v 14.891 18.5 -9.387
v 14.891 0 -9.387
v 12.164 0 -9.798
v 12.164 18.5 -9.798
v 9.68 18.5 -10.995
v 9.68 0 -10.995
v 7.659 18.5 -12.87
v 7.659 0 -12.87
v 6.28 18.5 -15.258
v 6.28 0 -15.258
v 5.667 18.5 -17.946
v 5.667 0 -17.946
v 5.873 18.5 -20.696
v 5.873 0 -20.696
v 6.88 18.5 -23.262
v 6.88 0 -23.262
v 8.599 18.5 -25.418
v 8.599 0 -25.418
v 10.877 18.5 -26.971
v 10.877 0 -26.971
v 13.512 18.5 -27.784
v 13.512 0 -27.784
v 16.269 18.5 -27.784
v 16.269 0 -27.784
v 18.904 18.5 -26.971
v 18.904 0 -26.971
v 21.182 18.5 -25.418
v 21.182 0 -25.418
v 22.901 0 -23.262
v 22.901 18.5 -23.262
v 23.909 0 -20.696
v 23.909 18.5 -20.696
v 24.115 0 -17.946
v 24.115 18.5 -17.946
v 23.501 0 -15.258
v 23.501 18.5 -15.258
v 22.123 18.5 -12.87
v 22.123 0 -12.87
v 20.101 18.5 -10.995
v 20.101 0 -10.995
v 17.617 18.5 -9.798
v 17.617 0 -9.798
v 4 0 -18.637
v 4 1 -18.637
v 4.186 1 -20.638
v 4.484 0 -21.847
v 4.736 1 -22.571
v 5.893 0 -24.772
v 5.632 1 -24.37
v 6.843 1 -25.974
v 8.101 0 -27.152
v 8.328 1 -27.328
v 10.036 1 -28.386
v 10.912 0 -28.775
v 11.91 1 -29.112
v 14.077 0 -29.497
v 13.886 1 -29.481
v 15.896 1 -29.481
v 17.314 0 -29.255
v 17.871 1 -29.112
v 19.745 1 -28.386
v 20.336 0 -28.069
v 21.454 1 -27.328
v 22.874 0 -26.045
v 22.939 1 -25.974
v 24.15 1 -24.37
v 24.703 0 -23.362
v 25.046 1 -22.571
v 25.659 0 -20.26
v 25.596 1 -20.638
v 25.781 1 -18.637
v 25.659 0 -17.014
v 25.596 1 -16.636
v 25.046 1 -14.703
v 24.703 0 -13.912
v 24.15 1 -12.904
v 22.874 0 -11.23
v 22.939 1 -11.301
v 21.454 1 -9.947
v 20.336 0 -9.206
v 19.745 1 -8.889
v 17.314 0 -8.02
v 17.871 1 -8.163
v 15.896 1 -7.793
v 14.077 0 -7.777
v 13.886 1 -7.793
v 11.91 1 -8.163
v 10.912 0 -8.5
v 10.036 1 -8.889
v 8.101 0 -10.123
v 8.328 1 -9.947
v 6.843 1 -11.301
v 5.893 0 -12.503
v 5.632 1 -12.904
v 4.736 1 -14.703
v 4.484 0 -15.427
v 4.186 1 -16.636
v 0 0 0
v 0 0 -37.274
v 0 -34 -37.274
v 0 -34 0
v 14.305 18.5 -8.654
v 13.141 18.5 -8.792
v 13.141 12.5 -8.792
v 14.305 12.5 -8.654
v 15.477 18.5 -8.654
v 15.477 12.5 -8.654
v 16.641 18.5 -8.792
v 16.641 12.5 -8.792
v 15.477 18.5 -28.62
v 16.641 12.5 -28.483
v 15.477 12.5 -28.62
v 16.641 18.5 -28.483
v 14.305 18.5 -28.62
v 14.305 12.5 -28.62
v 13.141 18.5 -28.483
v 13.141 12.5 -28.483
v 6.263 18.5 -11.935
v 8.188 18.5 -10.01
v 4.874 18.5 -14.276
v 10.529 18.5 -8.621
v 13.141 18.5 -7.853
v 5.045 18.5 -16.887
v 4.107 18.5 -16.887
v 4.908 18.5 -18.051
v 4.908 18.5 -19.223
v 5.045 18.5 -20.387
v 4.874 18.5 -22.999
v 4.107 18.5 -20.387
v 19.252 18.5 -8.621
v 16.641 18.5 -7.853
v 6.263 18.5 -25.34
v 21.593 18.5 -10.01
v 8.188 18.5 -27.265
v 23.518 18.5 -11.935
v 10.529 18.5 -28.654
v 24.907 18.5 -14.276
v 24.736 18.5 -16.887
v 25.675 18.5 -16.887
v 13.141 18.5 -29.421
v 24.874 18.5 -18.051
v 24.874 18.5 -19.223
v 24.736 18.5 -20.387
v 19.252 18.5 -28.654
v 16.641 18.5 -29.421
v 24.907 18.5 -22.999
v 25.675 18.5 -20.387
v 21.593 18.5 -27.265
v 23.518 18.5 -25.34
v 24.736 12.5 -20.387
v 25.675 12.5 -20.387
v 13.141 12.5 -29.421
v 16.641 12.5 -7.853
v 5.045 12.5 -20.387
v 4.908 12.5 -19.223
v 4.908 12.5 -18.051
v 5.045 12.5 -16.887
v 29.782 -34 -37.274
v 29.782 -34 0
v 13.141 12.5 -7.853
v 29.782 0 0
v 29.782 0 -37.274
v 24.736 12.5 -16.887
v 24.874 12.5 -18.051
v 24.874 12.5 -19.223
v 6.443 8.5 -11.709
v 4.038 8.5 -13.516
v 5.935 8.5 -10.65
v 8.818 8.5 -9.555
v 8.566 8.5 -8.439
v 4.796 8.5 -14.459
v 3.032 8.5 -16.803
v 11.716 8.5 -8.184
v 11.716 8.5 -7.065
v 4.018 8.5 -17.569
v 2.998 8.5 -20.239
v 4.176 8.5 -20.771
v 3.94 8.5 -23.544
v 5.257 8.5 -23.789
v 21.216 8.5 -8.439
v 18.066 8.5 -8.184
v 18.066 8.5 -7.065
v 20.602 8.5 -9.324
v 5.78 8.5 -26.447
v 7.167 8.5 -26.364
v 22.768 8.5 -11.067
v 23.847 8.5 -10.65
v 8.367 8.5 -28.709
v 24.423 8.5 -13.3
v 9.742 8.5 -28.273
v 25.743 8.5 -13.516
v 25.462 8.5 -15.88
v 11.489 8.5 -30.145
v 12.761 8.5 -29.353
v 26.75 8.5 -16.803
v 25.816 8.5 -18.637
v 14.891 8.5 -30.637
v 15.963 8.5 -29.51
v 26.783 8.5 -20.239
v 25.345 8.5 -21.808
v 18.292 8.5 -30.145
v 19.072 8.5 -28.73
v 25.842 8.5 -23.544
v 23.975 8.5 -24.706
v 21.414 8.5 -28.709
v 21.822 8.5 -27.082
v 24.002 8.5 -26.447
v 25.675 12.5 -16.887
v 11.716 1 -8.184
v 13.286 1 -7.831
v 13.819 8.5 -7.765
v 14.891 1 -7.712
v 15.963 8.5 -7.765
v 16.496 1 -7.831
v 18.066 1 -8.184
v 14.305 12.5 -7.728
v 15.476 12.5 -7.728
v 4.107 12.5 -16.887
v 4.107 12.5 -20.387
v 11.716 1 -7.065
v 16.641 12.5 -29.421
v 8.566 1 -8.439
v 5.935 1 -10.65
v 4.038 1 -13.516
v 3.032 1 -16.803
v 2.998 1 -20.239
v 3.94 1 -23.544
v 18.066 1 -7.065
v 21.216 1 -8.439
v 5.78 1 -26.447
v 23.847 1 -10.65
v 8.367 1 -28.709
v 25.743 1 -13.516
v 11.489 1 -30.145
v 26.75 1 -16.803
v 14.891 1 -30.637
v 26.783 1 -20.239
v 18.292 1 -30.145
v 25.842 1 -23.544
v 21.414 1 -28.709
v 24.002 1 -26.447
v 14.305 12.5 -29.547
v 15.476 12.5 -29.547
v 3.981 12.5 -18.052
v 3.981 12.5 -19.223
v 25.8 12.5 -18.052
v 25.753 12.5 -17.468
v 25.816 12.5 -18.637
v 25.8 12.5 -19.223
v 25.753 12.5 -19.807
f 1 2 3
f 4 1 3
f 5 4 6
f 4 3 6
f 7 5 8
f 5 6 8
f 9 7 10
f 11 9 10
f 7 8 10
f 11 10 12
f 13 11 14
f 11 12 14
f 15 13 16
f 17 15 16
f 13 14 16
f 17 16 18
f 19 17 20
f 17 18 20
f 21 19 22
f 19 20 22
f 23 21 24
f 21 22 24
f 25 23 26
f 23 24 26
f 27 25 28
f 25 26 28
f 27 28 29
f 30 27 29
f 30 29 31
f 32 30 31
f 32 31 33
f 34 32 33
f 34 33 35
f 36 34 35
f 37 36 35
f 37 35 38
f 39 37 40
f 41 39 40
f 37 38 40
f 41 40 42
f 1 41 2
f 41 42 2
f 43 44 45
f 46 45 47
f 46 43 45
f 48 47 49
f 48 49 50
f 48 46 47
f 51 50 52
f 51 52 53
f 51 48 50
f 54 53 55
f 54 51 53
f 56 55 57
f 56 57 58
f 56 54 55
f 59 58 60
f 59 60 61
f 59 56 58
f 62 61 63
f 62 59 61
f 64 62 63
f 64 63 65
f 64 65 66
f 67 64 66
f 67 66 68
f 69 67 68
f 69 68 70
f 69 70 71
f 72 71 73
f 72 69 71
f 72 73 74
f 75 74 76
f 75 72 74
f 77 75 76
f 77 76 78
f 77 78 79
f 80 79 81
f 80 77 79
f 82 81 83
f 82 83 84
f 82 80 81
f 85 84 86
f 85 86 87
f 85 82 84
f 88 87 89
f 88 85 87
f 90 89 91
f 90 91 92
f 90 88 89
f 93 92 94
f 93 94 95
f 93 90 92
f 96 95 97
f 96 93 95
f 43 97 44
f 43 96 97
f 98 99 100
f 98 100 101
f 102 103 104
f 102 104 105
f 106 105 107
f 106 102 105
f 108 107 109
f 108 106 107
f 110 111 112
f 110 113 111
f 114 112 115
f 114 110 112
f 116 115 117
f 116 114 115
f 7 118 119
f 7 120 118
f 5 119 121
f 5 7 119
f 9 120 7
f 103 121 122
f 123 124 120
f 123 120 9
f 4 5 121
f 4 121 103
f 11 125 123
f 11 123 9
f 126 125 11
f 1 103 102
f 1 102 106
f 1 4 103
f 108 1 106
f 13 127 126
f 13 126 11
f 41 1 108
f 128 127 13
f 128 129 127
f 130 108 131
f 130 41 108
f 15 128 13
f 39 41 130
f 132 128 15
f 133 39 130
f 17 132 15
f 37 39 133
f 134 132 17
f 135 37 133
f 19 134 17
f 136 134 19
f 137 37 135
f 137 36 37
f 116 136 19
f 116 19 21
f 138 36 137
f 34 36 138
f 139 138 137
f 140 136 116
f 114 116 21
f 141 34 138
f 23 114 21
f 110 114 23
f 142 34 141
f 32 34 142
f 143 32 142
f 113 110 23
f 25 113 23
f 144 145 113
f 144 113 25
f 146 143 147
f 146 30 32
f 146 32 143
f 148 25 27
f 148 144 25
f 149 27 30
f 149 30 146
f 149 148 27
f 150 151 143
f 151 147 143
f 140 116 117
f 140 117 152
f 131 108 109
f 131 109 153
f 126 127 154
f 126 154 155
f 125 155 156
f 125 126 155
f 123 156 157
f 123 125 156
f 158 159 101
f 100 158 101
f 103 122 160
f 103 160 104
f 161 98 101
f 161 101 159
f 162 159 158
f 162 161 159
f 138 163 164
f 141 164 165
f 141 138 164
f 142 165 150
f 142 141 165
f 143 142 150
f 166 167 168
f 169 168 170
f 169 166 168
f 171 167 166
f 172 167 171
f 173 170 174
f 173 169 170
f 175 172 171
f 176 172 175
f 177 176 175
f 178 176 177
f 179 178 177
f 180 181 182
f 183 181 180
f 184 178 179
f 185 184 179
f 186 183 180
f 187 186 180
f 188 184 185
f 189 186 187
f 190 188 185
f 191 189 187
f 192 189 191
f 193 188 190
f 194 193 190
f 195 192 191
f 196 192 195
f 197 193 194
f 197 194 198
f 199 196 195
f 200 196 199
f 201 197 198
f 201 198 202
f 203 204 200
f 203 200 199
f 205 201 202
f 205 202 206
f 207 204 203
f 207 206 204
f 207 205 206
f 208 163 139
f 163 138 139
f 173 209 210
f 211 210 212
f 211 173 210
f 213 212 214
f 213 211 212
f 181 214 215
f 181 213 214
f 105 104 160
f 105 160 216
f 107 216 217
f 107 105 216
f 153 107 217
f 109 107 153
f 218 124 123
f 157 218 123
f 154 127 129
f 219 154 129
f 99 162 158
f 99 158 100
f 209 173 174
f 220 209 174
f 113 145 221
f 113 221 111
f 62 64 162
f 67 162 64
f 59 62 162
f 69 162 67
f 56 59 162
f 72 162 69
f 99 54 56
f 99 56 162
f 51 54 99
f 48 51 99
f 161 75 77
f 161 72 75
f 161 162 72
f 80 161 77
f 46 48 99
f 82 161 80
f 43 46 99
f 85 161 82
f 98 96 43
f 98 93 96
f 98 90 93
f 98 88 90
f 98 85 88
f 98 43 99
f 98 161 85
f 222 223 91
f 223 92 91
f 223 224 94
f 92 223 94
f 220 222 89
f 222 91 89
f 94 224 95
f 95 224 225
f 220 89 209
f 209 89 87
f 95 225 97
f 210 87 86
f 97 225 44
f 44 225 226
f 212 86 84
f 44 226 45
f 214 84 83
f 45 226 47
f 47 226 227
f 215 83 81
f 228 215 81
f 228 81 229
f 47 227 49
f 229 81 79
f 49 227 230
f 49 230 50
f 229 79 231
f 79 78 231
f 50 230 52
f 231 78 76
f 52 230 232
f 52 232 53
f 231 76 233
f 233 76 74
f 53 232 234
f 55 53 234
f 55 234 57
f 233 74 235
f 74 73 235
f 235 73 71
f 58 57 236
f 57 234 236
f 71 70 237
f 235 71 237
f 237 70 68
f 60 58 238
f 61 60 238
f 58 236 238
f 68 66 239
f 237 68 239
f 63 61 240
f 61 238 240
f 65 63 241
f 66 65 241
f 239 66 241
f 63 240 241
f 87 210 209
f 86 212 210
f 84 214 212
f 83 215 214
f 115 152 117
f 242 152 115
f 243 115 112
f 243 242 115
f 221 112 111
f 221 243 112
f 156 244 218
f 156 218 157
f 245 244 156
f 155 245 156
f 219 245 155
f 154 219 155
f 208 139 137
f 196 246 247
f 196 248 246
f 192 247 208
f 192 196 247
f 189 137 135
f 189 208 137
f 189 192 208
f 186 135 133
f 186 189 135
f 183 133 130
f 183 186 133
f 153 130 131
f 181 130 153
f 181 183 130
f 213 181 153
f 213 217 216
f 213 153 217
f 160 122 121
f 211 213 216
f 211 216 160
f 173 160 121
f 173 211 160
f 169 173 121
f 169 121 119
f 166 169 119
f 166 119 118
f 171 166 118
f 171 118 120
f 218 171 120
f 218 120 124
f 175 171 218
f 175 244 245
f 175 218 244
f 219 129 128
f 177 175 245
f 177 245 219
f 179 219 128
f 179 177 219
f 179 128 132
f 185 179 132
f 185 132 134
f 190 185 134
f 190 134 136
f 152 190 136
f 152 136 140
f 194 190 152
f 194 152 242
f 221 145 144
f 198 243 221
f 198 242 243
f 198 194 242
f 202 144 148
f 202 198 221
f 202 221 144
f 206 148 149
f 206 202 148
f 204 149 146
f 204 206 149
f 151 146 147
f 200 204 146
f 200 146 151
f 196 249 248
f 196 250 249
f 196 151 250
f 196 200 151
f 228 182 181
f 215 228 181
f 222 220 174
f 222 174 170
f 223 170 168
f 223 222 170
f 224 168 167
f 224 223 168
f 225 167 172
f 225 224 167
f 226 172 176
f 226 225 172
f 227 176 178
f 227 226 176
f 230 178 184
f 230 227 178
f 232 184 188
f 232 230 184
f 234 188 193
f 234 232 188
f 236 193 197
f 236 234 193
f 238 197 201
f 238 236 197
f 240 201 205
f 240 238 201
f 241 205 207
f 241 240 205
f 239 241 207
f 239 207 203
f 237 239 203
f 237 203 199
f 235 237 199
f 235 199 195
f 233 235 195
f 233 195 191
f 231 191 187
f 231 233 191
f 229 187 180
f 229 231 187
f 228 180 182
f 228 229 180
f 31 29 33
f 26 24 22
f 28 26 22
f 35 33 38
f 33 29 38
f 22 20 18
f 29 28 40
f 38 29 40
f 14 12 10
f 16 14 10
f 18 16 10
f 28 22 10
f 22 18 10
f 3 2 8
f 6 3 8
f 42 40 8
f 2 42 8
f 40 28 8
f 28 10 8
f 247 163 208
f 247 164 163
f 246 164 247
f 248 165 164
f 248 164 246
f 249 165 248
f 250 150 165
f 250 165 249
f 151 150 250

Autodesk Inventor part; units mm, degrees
ref_plane "YZ Plane" through (0, 0, 0) normal (1, 0, 0) x (0, 1, 0)
ref_plane "XZ Plane" through (0, 0, 0) normal (0, 1, 0) x (-1, 0, 0)
ref_plane "XY Plane" through (0, 0, 0) normal (0, 0, 1) x (1, 0, 0)
sketch "Sketch1" plane through (0, 0, 0) normal (0, 1, 0) x (-1, 0, 0)
  line L0 (0, 0) -> (-29.7815, 0)
  line L1 (-29.7815, 0) -> (-29.7815, -37.2745)
  line L2 (-29.7815, -37.2745) -> (0, -37.2745)
  line L3 (0, -37.2745) -> (0, 0)
  line L4 (-14.8907, -37.2745) -> (-14.8907, 0)
  line L5 (0, -18.6373) -> (-29.7815, -18.6373)
  circle A0 centre (-14.8907, -18.6373) radius 10.8903
  dimension "d0" = 29.7815
  dimension "d1" = 37.2745
  dimension "d2" = 21.7805
extrude "Extrusion1" add sketch "Sketch1" against normal blind 34
extrude "Extrusion2" add sketch "Sketch1" along normal blind 1 contours A0 L5 L4 | L4 L5 A0 | A0 L4 L5 | L4 A0 L5
sketch "Sketch2" plane through (14.8907, 1, -18.6373) normal (0, 1, 0) x (1, 0, 0)
  circle A0 centre (0, 0) radius 12
  dimension "d9" = 24
extrude "Extrusion3" add sketch "Sketch2" along normal blind 7.5
sketch "Sketch3" plane through (14.8907, 8.5, -18.6373) normal (0, 1, 0) x (1, 0, 0)
  circle A0 centre (0, 0) radius 10.925
  circle A1 centre (0, 0) radius 12 projected
  line L0 (-3.175, -12) -> (3.175, -12)
  line L1 (3.175, -12) -> (3.175, 12)
  line L2 (3.175, 12) -> (-3.175, 12)
  line L3 (-3.175, 12) -> (-3.175, -12)
  line L4 (-3.175, -12) -> (3.175, 12) construction
  line L5 (3.175, -12) -> (-3.175, 12) construction
  point P0 (-3.175, -11.5724)
  point P1 (3.175, -11.5724)
  point P2 (-3.175, 11.5724)
  point P3 (3.175, 11.5724)
  point P4 (0, -12)
  point P5 (0, 12)
  point P6 (-3.175, -10.4535)
  point P7 (3.175, -10.4535)
  dimension "d12" = 21.85
  dimension "d21" = 6.35
extrude "Extrusion4" add sketch "Sketch3" along normal blind 10 contours A0 L1 | L1 A0 L3 | L3 A0
thread "Thread2" size "M24x0.75" class "6g" standard "ANSI Metric M Profile" full length
thread "Thread3" size "M22x0.75" class "6g" standard "ANSI Metric M Profile" length 10.0076 offset 4
extrude "Extrusion5" cut sketch "Sketch3" against normal up to surface (7.5 mm away) contours L1 A1 L3 A0 picked at (0, -11.2482)
sketch "Sketch4" plane through (14.8907, 18.5, -18.6373) normal (0, 1, 0) x (1, 0, 0)
  circle A0 centre (0, 0) radius 10.925 projected
  line L0 (-1.75, 10.925) -> (1.75, 10.925)
  line L1 (1.75, 10.925) -> (1.75, -10.925)
  line L2 (1.75, -10.925) -> (-1.75, -10.925)
  line L3 (-1.75, -10.925) -> (-1.75, 10.925)
  line L4 (-1.75, 10.925) -> (1.75, -10.925) construction
  line L5 (1.75, 10.925) -> (-1.75, -10.925) construction
  circle A1 centre (0, 0) radius 10
  line L6 (-10.925, -1.75) -> (10.925, -1.75)
  line L7 (10.925, -1.75) -> (10.925, 1.75)
  line L8 (10.925, 1.75) -> (-10.925, 1.75)
  line L9 (-10.925, 1.75) -> (-10.925, -1.75)
  line L10 (-10.925, -1.75) -> (10.925, 1.75) construction
  line L11 (10.925, -1.75) -> (-10.925, 1.75) construction
  point P0 (-9.8457, 1.75)
  point P1 (-10.7839, 1.75)
  point P2 (-10.7839, -1.75)
  point P3 (-9.8457, -1.75)
  point P4 (-1.75, 9.8457)
  point P5 (1.75, 9.8457)
  point P6 (1.75, 10.7839)
  point P7 (-1.75, 10.7839)
  point P8 (10.7839, 1.75)
  point P9 (9.8457, 1.75)
  point P10 (9.8457, -1.75)
  point P11 (10.7839, -1.75)
  point P12 (1.75, -9.8457)
  point P13 (-1.75, -9.8457)
  point P14 (-1.75, -10.7839)
  point P15 (1.75, -10.7839)
  dimension "d25" = 3.5
  dimension "d26" = 20
  dimension "d27" = 3.5
extrude "Extrusion6" cut sketch "Sketch4" against normal blind 6 contours A0 L6 A1 L8 | L1 A1 L3 A0 | A0 L3 A1 L1 | L8 A1 L6 A0
hole "Hole1" at (14.8907, 18.5, -18.6373) direction (0, -1, 0) diameter 18.5 depth 18.5
properties material "ABS Plastic"
